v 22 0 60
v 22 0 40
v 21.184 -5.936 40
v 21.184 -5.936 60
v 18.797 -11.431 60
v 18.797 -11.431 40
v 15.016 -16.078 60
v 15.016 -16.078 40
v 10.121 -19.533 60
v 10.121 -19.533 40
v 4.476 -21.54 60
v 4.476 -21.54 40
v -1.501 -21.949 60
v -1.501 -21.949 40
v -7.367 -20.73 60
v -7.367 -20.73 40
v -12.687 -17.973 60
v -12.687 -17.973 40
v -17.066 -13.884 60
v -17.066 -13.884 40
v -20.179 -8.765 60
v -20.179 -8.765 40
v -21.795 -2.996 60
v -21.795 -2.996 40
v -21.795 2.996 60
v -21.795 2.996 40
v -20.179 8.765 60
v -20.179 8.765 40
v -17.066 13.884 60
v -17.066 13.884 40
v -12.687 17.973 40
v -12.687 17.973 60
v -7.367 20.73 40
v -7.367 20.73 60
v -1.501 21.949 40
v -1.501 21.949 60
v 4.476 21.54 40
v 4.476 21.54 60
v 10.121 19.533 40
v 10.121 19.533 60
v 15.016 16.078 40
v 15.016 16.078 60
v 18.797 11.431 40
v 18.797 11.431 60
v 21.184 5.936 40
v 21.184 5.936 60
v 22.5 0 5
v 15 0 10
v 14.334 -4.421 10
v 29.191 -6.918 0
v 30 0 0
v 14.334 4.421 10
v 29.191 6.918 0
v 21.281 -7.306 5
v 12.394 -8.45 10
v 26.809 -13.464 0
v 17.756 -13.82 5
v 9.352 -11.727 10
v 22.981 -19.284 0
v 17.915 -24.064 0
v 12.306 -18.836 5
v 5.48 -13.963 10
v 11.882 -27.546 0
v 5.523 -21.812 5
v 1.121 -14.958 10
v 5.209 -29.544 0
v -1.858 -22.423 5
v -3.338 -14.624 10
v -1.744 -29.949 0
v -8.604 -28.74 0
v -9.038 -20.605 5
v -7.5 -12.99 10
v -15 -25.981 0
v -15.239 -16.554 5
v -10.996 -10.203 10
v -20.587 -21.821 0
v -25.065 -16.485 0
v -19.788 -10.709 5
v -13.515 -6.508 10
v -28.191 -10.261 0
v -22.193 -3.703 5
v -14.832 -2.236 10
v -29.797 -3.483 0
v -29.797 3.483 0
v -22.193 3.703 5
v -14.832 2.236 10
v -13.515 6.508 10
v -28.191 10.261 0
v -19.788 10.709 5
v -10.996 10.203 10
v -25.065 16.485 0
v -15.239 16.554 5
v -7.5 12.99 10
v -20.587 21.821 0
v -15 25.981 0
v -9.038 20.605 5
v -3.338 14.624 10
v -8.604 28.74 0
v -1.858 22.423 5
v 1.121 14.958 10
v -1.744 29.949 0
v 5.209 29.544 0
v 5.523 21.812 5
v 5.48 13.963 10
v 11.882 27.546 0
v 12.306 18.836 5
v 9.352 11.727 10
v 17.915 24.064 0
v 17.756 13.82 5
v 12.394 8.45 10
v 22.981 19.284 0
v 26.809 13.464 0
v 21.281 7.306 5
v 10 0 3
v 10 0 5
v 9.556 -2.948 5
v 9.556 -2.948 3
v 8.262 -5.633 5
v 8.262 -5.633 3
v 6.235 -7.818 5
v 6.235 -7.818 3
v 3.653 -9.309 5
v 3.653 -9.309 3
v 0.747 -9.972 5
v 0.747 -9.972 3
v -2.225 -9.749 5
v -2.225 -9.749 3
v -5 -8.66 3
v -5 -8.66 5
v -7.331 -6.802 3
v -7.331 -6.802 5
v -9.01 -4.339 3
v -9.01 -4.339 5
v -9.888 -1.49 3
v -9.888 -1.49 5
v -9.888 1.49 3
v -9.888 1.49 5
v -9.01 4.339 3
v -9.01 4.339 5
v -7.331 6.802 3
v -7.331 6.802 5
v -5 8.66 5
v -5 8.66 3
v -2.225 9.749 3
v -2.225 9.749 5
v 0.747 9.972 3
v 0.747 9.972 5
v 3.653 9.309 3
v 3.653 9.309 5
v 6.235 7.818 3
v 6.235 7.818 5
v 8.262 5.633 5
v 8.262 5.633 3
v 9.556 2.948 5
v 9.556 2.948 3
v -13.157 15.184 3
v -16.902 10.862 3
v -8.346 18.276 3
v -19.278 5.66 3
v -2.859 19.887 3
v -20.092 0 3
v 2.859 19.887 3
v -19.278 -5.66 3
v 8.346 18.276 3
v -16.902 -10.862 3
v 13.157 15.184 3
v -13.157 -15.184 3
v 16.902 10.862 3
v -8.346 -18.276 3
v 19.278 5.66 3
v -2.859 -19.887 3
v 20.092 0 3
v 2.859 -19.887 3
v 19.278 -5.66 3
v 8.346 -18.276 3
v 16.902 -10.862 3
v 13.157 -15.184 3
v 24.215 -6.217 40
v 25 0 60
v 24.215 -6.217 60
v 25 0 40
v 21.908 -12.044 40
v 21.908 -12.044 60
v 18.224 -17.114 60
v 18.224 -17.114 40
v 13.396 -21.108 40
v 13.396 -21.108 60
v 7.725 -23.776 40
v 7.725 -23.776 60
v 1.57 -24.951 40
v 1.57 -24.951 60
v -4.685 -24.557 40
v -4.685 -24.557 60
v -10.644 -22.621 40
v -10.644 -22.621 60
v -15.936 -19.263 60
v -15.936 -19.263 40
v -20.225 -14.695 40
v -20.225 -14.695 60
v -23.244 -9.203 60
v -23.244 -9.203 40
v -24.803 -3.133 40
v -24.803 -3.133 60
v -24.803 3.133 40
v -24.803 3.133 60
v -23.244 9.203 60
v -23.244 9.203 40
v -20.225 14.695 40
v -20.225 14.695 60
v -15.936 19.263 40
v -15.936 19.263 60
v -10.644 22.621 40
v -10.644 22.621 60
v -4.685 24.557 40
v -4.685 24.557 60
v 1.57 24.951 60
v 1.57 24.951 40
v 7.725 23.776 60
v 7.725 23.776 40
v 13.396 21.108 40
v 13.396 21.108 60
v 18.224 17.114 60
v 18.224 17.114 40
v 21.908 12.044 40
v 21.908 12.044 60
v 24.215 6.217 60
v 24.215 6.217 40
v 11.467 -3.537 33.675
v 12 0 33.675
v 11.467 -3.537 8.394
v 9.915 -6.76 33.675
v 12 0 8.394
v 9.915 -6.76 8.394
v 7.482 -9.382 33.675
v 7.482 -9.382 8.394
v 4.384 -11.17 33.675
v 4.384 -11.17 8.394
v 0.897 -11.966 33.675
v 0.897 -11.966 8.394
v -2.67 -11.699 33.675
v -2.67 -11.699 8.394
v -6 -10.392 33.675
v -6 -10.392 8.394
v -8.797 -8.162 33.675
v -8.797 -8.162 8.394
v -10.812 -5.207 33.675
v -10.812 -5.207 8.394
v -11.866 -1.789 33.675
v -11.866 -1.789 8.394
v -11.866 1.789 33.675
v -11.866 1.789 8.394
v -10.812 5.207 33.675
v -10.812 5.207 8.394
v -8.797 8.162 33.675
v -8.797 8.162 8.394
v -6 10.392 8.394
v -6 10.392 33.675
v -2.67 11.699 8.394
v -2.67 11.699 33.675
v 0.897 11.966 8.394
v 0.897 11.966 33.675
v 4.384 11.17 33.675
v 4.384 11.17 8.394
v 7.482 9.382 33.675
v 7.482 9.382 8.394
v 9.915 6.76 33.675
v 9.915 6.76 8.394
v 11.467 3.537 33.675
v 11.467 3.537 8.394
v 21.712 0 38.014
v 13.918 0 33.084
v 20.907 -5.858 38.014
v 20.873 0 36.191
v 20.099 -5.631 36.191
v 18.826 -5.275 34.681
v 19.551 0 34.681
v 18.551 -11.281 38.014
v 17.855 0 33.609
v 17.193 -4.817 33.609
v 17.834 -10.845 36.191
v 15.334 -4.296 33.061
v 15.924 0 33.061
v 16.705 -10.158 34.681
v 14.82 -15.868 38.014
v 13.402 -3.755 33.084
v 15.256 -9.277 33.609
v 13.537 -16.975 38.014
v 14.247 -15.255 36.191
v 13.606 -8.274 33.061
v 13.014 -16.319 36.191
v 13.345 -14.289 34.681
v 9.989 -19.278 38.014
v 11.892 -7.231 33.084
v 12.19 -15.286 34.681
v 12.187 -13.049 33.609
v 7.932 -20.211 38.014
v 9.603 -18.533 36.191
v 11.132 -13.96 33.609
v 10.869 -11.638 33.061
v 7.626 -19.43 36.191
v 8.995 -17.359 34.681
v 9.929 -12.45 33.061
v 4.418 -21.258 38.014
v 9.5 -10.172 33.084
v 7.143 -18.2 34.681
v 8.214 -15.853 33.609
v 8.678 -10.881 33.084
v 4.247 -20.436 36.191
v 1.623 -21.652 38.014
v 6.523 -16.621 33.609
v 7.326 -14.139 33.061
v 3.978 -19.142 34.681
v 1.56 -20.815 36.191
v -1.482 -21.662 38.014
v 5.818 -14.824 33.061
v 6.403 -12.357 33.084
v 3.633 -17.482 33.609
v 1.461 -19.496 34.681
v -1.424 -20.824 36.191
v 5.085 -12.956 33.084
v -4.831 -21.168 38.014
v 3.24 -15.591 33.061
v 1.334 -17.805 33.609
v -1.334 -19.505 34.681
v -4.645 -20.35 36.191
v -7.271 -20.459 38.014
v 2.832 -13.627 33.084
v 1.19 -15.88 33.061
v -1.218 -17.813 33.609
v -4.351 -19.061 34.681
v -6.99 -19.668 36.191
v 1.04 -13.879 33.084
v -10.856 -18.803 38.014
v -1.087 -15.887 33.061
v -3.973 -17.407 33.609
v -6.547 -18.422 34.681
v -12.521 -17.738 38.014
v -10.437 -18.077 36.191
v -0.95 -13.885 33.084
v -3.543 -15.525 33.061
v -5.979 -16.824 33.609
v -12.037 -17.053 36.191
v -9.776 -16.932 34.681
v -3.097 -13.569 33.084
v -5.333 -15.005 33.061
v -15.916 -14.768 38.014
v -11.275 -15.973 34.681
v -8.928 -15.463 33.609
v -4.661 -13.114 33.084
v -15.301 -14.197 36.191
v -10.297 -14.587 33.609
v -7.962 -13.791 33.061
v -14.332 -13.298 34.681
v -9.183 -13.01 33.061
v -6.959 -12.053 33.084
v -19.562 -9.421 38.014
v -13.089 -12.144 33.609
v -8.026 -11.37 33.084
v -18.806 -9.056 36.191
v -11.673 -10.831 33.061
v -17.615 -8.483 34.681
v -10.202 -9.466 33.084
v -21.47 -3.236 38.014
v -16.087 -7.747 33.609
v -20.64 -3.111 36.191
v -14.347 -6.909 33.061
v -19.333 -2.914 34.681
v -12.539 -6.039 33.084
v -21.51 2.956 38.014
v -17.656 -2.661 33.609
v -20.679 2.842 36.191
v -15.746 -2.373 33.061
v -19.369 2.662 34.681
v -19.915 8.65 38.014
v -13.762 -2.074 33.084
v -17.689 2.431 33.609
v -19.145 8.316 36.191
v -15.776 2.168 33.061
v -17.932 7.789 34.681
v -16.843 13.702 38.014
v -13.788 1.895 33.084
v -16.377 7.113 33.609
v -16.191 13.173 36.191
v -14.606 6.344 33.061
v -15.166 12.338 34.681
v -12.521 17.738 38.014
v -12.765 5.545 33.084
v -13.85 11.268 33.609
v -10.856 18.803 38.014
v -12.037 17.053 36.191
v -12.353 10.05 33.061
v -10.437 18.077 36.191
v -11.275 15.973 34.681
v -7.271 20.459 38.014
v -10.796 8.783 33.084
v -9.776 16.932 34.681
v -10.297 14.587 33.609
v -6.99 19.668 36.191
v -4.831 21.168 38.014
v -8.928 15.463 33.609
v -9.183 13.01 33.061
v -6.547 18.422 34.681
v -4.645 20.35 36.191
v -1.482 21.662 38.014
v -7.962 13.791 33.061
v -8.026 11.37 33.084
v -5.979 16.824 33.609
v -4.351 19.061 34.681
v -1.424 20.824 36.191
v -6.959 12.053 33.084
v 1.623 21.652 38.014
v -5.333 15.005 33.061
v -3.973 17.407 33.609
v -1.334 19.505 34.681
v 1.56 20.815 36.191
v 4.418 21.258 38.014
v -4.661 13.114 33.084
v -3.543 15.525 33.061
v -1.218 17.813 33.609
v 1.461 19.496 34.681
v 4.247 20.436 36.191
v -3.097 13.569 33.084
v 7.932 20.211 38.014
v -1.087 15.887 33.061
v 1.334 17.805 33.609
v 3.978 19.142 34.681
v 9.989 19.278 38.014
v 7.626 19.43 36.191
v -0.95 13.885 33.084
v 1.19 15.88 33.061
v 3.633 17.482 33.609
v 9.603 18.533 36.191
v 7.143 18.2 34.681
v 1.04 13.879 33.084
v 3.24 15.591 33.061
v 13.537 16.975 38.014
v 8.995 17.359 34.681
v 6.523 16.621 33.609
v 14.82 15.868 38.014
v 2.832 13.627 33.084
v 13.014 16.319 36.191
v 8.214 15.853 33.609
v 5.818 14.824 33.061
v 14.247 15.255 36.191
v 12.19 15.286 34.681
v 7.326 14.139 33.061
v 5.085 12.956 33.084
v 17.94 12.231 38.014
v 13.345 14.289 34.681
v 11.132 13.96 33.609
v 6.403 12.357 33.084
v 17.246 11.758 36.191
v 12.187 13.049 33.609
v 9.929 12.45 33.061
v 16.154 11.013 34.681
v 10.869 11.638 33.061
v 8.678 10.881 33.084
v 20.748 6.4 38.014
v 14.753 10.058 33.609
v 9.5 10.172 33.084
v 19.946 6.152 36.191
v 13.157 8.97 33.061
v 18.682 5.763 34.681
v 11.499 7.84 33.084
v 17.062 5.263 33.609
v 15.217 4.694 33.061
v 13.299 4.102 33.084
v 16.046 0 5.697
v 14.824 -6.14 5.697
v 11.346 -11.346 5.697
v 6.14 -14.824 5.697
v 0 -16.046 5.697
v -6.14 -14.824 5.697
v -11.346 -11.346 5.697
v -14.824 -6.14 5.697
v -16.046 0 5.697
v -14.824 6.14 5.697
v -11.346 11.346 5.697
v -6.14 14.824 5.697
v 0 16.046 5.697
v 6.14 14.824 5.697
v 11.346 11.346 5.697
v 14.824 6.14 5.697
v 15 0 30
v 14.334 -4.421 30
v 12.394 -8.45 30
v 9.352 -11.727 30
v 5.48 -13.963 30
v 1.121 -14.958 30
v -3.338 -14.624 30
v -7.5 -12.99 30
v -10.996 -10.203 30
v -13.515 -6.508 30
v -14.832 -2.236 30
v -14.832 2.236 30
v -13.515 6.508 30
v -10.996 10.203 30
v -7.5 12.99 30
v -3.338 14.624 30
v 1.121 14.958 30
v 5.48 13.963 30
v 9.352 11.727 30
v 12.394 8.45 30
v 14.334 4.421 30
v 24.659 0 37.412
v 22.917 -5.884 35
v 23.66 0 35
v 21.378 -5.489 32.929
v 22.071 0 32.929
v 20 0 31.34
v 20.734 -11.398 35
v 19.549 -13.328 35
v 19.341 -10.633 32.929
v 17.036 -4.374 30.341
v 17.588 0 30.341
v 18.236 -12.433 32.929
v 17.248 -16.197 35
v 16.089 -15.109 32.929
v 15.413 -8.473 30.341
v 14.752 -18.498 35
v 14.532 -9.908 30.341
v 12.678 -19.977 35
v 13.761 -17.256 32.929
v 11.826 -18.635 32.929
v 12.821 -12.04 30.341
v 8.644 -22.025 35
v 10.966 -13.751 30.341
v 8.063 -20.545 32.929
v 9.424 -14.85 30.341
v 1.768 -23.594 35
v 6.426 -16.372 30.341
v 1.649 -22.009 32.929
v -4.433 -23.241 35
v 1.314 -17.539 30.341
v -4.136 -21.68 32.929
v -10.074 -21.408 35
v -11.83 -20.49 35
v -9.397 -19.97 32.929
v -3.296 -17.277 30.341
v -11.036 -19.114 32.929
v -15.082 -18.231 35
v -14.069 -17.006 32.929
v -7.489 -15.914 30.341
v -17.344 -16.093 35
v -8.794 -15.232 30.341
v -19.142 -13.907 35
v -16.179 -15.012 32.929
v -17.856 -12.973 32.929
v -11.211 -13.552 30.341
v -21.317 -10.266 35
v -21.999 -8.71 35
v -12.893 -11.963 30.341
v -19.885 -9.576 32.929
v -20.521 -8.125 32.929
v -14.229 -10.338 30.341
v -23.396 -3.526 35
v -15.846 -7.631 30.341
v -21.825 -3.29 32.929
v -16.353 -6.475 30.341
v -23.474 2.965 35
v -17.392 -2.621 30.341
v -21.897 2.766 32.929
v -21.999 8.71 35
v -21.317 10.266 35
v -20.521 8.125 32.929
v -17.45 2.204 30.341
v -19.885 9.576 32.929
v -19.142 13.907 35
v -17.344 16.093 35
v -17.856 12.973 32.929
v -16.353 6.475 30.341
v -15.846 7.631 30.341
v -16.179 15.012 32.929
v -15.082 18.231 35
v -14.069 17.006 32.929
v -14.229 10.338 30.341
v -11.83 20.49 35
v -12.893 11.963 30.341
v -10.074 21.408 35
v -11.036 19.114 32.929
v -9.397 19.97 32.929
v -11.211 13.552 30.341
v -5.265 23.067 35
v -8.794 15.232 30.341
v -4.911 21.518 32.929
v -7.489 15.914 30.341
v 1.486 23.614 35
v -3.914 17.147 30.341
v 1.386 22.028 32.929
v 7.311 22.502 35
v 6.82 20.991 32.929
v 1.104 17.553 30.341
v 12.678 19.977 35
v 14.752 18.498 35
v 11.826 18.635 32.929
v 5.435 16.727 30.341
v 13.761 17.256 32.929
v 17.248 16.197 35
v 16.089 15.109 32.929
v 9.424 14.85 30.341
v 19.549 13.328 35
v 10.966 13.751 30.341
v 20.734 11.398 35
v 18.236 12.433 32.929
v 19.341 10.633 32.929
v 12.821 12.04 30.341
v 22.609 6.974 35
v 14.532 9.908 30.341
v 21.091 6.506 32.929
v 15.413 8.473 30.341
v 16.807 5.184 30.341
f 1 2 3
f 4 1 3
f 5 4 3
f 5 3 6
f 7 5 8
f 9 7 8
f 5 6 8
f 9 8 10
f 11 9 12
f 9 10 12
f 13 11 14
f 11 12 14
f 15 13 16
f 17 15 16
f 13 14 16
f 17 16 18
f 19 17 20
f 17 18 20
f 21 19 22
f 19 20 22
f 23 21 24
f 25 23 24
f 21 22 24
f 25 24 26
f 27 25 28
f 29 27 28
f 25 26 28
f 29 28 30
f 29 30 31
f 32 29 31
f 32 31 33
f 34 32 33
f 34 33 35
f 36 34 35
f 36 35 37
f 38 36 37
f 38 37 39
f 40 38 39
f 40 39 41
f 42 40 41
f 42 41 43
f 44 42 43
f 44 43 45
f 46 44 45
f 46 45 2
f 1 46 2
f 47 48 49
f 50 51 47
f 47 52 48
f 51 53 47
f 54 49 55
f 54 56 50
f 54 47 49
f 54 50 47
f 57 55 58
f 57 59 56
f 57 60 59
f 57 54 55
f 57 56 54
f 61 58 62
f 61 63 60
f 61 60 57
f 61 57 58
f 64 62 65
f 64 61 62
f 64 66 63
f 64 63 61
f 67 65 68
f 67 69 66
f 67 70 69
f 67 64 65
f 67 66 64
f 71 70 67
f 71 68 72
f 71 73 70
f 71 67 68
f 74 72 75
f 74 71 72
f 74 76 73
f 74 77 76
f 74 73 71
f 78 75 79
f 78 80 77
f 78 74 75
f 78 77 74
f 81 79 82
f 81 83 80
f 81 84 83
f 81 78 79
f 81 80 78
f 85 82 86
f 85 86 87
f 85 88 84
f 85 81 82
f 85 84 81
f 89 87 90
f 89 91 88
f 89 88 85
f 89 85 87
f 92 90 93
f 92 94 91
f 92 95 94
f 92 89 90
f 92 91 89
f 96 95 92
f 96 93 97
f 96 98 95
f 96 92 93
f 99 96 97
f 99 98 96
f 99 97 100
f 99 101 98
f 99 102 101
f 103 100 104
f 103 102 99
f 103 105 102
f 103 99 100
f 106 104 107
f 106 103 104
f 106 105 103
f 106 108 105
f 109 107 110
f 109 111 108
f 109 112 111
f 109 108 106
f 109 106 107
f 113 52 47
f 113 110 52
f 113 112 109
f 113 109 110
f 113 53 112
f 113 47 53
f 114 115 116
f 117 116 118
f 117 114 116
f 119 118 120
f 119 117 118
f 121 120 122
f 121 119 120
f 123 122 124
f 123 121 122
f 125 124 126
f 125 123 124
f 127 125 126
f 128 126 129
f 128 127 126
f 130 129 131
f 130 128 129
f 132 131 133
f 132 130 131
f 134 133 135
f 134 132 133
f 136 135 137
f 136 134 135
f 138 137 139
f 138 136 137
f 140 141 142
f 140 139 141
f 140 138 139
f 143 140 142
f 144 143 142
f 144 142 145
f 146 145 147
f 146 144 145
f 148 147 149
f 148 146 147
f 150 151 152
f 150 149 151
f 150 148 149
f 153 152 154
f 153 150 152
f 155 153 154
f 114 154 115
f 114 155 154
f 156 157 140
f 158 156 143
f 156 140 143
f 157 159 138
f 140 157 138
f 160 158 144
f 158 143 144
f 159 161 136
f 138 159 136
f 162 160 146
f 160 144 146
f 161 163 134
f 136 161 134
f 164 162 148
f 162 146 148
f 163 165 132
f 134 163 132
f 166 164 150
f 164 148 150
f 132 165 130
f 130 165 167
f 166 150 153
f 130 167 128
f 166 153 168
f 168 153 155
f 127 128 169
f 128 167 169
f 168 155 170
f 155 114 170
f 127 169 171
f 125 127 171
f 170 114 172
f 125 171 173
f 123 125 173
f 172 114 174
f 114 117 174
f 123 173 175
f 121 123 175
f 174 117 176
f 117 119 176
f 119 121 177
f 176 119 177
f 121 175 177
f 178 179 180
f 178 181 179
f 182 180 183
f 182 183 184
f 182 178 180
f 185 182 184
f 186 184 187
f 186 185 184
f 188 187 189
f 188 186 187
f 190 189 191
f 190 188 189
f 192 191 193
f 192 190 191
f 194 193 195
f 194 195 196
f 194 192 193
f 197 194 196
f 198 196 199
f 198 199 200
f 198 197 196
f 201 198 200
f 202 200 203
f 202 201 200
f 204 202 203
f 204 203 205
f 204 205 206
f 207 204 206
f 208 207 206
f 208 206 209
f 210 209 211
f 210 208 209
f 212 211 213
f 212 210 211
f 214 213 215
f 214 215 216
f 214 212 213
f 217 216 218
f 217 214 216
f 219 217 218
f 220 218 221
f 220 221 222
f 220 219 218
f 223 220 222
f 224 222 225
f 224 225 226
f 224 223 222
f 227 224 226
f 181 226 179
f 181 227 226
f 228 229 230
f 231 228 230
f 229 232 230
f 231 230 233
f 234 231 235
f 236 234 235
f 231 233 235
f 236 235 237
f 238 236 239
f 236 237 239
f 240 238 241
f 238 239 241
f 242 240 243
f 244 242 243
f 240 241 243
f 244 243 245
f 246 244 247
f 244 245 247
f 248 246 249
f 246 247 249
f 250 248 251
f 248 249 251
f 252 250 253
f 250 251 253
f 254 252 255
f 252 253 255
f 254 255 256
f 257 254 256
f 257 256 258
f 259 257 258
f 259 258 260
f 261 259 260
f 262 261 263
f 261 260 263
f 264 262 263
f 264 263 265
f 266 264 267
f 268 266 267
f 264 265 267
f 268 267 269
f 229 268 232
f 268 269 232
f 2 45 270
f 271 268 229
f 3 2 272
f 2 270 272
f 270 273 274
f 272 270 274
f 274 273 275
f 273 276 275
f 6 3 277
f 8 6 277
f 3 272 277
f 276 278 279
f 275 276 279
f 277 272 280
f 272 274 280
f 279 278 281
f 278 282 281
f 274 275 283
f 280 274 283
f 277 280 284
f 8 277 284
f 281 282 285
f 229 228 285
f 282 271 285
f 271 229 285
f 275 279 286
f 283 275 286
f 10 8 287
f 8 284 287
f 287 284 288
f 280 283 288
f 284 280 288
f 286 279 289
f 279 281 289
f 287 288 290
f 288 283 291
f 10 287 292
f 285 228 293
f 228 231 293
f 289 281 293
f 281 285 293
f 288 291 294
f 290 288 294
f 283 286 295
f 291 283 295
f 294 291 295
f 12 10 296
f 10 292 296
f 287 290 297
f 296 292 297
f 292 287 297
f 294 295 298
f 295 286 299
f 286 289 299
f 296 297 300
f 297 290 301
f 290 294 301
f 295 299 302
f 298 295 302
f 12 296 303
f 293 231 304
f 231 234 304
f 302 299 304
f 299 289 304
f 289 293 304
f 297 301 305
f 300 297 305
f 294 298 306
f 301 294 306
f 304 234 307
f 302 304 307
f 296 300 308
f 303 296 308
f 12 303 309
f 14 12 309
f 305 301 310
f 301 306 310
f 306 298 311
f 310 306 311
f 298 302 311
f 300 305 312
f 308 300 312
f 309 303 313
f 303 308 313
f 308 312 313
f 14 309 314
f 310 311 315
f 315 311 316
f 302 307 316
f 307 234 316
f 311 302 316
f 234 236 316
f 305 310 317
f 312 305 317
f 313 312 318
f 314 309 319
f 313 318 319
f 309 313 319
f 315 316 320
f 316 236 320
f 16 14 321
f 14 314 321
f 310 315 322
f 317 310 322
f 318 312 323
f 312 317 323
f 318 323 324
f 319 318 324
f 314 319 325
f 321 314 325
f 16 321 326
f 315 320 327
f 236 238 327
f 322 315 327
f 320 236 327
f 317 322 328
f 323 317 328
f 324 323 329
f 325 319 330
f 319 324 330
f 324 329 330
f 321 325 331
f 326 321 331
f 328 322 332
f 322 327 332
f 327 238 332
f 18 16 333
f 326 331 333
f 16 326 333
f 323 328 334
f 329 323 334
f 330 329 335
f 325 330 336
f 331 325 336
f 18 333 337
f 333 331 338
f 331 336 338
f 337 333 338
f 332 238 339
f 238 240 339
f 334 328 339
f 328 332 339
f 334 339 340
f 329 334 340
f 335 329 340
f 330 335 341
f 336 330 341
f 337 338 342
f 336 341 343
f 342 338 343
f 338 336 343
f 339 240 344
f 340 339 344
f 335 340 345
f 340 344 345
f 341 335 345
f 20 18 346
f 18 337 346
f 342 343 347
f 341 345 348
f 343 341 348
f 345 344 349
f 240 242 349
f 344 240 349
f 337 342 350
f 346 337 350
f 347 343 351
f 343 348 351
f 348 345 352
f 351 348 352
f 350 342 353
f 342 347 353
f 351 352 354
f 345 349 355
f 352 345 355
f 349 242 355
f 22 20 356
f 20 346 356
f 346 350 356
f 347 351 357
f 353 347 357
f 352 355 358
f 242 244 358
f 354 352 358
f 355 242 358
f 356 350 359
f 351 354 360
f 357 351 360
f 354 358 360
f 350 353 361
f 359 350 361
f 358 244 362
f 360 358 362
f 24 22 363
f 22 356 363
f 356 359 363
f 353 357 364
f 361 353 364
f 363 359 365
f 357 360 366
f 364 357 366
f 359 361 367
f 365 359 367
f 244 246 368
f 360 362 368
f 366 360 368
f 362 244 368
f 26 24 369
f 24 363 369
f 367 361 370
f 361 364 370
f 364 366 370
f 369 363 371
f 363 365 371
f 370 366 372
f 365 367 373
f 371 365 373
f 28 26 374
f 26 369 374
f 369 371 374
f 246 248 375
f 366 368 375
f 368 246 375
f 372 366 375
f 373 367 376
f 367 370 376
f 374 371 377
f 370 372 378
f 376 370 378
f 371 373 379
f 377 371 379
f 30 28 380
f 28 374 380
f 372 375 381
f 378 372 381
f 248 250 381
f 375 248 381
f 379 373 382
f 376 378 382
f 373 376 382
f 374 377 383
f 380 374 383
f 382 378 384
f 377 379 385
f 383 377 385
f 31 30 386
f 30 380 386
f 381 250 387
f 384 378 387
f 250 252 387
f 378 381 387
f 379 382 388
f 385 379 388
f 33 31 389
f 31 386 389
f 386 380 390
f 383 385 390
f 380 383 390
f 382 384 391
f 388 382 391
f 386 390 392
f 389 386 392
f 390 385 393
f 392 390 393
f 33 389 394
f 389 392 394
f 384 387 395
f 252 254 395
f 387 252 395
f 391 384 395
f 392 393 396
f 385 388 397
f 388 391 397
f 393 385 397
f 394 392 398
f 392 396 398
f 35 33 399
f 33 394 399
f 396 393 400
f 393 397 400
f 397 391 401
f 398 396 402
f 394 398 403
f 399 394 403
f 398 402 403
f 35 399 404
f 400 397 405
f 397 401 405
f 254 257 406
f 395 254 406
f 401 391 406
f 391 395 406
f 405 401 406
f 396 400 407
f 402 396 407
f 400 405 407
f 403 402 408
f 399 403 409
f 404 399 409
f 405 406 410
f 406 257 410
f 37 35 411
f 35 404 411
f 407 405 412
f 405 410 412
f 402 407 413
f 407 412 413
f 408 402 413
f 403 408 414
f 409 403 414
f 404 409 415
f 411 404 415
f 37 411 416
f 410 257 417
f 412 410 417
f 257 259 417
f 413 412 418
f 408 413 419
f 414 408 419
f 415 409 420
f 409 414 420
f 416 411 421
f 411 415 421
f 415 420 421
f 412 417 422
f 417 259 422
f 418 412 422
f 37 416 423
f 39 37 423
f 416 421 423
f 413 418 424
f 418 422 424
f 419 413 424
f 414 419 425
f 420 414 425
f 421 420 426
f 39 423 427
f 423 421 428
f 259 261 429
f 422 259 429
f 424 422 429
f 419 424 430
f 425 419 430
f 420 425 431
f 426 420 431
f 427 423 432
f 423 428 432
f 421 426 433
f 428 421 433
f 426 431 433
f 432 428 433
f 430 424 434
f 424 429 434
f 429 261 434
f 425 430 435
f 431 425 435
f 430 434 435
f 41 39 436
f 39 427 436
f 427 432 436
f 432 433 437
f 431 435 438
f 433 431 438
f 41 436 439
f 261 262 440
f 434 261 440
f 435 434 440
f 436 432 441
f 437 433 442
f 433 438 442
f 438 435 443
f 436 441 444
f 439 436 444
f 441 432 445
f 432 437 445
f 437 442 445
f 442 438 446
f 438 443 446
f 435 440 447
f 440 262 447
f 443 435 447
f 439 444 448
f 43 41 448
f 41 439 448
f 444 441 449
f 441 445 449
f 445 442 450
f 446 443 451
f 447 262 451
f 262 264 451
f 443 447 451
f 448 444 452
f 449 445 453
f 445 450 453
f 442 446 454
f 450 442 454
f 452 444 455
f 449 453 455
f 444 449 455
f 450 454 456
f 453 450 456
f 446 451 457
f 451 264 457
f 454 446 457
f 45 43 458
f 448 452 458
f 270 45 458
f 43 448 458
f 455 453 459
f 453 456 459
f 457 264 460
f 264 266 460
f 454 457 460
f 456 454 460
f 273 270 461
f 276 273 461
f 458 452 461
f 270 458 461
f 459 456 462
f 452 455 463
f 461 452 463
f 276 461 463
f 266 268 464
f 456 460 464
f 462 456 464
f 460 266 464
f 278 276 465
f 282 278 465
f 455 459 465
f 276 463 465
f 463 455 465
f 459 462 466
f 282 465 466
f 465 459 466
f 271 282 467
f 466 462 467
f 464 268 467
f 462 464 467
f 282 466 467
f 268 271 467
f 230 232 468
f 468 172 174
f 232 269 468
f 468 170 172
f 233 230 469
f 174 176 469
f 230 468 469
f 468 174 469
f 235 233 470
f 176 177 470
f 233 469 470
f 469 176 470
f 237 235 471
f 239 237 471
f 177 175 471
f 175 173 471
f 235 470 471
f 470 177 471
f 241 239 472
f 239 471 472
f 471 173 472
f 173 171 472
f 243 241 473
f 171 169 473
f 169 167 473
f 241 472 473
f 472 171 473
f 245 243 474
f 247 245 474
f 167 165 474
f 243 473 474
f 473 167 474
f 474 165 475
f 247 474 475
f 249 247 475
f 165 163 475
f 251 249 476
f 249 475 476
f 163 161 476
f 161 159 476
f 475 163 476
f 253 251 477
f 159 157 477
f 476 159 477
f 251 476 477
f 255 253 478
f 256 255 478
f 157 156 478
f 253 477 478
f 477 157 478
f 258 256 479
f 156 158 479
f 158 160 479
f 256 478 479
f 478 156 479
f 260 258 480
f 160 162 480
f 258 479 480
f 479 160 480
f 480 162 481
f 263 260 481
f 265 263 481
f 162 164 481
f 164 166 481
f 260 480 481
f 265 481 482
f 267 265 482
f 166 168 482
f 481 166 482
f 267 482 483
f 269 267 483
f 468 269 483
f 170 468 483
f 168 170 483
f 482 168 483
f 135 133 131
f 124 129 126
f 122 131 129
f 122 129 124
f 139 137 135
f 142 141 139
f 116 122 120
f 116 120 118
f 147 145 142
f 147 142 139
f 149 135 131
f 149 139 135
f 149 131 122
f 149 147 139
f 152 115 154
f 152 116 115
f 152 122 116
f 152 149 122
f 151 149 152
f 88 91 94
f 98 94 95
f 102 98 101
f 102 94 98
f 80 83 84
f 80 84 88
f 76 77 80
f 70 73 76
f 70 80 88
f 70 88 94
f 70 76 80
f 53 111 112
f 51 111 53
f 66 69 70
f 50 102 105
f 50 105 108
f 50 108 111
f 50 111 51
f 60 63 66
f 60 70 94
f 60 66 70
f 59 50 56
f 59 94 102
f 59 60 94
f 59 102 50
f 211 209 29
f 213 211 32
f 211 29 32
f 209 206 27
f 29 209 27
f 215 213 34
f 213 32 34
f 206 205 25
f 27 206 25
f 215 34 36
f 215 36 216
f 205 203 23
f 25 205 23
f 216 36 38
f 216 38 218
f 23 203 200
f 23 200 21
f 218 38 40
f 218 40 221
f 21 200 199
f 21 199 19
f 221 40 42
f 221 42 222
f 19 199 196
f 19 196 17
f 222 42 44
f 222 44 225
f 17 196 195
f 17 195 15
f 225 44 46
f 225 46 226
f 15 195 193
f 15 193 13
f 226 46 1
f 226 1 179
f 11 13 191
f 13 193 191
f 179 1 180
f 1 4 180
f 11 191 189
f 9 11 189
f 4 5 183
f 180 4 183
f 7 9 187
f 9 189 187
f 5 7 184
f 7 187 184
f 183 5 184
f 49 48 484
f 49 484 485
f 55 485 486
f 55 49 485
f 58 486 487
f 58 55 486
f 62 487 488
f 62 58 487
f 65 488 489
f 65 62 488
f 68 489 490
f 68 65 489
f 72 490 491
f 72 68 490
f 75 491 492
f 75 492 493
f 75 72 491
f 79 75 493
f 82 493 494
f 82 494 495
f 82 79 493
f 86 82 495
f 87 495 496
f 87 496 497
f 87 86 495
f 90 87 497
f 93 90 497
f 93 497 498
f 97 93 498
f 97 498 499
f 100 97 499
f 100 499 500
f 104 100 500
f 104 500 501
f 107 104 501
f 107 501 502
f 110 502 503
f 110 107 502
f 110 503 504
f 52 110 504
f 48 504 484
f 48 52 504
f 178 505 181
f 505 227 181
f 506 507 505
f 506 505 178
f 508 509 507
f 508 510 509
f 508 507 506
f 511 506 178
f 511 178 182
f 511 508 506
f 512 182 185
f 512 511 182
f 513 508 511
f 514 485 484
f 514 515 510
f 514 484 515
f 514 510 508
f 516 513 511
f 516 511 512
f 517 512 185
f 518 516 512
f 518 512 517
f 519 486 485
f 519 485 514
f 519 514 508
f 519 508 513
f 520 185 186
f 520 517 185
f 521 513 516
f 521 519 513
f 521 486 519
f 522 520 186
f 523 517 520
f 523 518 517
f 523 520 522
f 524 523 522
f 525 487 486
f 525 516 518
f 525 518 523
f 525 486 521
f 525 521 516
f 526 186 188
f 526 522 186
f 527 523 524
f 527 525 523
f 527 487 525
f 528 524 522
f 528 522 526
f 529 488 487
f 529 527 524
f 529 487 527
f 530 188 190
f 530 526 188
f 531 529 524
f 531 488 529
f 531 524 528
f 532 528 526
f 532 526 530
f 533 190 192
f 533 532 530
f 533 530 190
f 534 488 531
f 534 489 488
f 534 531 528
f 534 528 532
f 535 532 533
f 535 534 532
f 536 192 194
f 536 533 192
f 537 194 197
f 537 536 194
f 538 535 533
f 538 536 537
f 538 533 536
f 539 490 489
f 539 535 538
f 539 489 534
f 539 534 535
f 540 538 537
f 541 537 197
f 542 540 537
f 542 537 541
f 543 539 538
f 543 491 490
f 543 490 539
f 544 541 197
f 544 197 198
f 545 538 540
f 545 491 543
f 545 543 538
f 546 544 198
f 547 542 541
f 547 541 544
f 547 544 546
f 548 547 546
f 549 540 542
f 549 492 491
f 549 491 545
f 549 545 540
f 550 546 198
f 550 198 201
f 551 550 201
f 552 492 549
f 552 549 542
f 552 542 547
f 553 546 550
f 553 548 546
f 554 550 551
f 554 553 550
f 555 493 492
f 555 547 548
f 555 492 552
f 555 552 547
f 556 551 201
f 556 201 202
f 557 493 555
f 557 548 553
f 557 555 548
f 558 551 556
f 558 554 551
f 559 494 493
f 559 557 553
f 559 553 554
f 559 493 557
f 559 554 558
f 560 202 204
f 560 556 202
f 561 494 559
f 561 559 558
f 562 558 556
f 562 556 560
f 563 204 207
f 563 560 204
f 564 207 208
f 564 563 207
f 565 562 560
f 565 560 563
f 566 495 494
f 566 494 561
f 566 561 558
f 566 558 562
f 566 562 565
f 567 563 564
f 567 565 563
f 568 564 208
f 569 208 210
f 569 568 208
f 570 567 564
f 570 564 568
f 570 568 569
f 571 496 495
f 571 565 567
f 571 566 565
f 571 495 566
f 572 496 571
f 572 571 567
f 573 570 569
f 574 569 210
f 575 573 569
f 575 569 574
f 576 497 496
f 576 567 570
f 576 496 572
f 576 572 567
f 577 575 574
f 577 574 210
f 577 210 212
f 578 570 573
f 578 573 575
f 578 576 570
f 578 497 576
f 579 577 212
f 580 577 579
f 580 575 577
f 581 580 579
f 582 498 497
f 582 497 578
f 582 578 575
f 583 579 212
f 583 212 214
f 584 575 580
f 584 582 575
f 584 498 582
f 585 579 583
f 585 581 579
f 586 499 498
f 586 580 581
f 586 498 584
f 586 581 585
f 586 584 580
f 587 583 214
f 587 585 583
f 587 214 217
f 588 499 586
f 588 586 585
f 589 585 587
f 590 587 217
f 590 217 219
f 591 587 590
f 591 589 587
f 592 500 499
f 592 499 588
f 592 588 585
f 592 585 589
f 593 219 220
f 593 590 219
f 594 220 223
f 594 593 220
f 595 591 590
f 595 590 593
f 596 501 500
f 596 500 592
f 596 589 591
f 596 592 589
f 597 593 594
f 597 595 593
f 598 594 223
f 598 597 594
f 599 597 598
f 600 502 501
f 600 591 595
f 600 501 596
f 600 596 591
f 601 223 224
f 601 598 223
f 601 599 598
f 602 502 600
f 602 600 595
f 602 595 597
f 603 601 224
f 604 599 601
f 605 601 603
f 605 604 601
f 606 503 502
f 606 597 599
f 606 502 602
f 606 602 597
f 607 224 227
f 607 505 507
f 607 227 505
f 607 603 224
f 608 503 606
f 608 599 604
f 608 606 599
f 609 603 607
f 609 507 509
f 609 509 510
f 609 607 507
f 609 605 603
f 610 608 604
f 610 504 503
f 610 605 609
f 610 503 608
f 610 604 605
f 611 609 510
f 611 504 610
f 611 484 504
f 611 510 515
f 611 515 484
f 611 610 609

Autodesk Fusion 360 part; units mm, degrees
sketch "outline" plane through (0, 0, 0) normal (0, 1, 0) x (1, 0, 0)
  line L0 (25, -60) -> (25, -40)
  arc A0 (25, -40) -> (15, -30) centre (15, -40) ccw
  line L1 (15, -30) -> (15, -10)
  line L2 (15, -10) -> (30, 0)
  line L3 (30, 0) -> (10, 0)
  line L4 (22, -60) -> (22, -40)
  arc A1 (22, -40) -> (12, -33.6754) centre (15, -40) ccw
  line L5 (12, -33.6754) -> (12, -8.3944)
  line L6 (12, -8.3944) -> (20.0917, -3)
  line L7 (20.0917, -3) -> (10, -3)
  line L8 (22, -60) -> (25, -60)
  line L9 (10, -3) -> (10, 0)
  line L10 (0, -60) -> (0, 0) construction
  dimension "d1" = -3
  dimension "d2" = 20
  dimension "d3" = 10
  dimension "d4" = 20
  dimension "d5" = 18.0278
  dimension "d6" = 20
revolve "Revolve1" add sketch "outline" angle 360 about axis through (0, 0, 60) along (0, 0, -1)
sketch "Sketch2" plane through (0, 0, 0) normal (0, 0, 1) x (1, 0, 0)
  circle A0 centre (0, 0) radius 10
extrude "Extrude1" add sketch "Sketch2" along normal blind 5
